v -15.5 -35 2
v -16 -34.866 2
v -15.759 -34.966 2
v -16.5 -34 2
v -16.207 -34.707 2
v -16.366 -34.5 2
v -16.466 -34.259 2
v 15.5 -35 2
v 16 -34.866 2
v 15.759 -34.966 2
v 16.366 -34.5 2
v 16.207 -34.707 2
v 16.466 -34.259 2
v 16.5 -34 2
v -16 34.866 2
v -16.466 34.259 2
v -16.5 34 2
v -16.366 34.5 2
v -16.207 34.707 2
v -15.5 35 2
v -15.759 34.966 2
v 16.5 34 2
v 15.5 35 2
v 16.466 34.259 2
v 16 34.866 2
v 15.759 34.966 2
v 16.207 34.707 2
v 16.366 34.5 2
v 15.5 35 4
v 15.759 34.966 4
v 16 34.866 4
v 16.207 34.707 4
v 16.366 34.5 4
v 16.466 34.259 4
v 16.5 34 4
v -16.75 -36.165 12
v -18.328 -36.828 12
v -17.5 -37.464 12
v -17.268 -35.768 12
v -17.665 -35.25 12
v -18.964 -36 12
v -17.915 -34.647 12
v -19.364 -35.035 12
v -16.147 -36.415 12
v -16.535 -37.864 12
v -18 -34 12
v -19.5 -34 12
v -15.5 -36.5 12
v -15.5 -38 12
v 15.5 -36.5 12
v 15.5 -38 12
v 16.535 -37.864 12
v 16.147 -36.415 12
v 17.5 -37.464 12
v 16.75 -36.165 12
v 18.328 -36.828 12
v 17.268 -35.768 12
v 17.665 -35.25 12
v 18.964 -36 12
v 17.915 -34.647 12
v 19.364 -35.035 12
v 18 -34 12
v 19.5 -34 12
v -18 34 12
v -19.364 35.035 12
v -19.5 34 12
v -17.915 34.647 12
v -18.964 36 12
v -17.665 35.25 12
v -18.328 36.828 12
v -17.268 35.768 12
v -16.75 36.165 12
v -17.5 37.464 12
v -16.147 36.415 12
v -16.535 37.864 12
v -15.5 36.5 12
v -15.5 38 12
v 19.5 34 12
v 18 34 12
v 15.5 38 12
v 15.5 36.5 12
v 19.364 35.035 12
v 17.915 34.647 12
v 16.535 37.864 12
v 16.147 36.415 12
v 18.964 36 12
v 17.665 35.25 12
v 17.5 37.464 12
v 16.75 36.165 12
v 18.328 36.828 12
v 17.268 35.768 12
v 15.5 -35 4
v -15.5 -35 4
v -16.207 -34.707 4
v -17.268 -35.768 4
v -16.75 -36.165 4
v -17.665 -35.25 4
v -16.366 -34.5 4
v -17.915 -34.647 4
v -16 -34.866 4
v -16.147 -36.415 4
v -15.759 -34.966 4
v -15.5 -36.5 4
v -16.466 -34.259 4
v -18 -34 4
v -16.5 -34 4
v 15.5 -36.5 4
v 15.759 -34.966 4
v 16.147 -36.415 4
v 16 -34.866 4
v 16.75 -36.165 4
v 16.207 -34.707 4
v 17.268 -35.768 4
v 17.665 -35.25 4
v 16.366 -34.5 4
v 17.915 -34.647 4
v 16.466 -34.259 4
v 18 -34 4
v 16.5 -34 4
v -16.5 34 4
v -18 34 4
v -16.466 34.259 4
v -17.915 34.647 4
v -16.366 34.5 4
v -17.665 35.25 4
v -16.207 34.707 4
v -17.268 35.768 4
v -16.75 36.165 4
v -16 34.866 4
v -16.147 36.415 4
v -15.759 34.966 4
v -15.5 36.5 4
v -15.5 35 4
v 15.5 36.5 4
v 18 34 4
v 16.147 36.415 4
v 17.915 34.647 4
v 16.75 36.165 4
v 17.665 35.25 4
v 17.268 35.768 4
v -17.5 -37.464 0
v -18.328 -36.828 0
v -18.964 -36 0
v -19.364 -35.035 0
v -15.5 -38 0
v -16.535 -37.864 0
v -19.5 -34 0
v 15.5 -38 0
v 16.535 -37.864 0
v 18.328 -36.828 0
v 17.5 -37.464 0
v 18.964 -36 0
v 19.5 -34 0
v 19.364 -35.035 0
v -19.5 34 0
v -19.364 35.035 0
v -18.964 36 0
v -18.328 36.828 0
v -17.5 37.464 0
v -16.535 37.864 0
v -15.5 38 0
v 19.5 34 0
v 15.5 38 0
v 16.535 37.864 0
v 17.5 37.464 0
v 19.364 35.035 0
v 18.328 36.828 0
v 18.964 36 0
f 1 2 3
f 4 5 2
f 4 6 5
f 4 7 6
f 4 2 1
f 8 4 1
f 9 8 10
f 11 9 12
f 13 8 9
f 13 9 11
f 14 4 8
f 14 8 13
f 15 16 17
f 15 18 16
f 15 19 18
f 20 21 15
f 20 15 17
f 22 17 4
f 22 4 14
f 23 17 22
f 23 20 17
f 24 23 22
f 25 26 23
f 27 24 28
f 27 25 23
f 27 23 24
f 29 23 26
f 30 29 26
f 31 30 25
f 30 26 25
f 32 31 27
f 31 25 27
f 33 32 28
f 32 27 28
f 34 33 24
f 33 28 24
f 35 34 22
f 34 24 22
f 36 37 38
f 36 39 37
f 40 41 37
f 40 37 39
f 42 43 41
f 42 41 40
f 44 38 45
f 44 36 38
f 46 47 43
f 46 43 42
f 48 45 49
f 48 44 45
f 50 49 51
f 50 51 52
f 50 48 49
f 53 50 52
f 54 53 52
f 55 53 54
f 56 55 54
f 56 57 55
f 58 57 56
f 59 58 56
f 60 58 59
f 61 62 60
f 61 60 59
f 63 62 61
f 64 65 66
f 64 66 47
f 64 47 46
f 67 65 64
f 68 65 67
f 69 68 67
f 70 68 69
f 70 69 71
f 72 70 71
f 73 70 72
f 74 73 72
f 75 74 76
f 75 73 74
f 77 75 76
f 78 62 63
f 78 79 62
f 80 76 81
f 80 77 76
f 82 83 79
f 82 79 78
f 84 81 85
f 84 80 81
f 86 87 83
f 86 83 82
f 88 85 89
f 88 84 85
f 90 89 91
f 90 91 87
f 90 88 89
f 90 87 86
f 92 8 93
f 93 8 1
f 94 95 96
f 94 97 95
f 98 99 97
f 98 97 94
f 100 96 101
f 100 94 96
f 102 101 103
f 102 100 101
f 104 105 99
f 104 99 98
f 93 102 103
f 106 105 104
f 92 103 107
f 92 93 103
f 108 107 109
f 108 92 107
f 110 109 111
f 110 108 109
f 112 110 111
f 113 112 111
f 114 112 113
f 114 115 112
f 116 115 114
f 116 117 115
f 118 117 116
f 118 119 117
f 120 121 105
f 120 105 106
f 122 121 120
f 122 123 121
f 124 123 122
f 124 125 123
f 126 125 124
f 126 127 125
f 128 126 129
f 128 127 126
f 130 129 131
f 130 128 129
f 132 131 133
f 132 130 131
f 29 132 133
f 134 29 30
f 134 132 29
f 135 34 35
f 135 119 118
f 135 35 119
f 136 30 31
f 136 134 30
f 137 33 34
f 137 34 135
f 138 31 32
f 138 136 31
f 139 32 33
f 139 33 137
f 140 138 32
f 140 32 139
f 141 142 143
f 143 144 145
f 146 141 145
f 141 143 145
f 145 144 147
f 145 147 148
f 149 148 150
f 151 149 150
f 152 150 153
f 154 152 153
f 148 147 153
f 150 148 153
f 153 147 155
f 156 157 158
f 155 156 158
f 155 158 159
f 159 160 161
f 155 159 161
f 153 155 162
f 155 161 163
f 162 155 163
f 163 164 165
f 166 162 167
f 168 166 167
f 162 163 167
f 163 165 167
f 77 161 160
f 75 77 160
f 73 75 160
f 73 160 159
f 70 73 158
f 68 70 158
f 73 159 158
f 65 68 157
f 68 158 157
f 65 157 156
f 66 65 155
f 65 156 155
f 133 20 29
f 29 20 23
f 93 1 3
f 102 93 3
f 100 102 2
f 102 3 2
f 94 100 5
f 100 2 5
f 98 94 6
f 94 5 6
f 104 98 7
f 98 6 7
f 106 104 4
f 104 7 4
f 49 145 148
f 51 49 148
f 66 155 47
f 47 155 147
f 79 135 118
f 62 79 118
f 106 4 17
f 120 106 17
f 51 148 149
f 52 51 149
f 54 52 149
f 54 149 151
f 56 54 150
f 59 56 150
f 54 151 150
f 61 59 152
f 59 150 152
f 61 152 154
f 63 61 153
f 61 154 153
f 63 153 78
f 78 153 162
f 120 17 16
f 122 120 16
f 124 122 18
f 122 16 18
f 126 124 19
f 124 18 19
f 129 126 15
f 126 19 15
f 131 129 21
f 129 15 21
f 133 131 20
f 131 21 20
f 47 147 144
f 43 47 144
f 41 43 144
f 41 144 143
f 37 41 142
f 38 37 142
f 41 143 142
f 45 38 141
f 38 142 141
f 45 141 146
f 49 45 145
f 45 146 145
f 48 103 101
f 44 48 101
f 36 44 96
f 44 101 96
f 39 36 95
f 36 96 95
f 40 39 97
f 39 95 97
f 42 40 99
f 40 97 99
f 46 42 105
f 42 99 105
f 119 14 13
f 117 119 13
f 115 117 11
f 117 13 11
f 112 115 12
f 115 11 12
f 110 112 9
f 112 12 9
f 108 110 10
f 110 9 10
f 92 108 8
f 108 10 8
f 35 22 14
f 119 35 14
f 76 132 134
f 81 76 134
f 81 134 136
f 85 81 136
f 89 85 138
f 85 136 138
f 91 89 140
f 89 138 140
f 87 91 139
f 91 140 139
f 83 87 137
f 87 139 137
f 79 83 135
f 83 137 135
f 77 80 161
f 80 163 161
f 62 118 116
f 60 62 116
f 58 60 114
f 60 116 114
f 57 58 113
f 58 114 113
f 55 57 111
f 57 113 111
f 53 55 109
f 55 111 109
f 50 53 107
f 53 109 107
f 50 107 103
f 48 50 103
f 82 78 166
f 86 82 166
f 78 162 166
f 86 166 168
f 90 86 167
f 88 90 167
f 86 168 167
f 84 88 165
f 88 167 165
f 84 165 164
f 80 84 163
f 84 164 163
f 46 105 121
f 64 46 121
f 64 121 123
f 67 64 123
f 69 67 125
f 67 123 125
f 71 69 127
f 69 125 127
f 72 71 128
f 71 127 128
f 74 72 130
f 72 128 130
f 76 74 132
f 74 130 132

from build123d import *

# Parameters (mm, degrees)
F1_DEPTH = 2
F3_DEPTH = 2
F5_DEPTH = 10


with BuildPart() as f1:
    # F0 (on Top) → F1 (new body)
    with BuildSketch(Plane.XY):
        with BuildLine():
            Line((15.5, 38), (-15.5, 38))
            ThreePointArc((-15.5, 38), (-18.328427, 36.828427), (-19.5, 34))
            Line((-19.5, 34), (-19.5, -34))
            ThreePointArc((-19.5, -34), (-18.328427, -36.828427), (-15.5, -38))
            Line((-15.5, -38), (15.5, -38))
            ThreePointArc((15.5, -38), (18.328427, -36.828427), (19.5, -34))
            Line((19.5, -34), (19.5, 34))
            ThreePointArc((19.5, 34), (18.328427, 36.828427), (15.5, 38))
        make_face()
    extrude(amount=F1_DEPTH)

    # F2 (on face) → F3 (join)
    with BuildSketch(Plane.XY.offset(2)):
        with BuildLine():
            Line((19.5, -34), (19.5, 34))
            ThreePointArc((19.5, 34), (18.328427, 36.828427), (15.5, 38))
            Line((15.5, 38), (-15.5, 38))
            ThreePointArc((-15.5, 38), (-18.328427, 36.828427), (-19.5, 34))
            Line((-19.5, 34), (-19.5, -34))
            ThreePointArc((-19.5, -34), (-18.328427, -36.828427), (-15.5, -38))
            Line((-15.5, -38), (15.5, -38))
            ThreePointArc((15.5, -38), (18.328427, -36.828427), (19.5, -34))
        make_face()
        with BuildLine():
            ThreePointArc((-16.5, 34), (-16.207107, 34.707107), (-15.5, 35))
            Line((-15.5, 35), (15.5, 35))
            ThreePointArc((15.5, 35), (16.207107, 34.707107), (16.5, 34))
            Line((16.5, 34), (16.5, -34))
            ThreePointArc((16.5, -34), (16.207107, -34.707107), (15.5, -35))
            Line((15.5, -35), (-15.5, -35))
            ThreePointArc((-15.5, -35), (-16.207107, -34.707107), (-16.5, -34))
            Line((-16.5, -34), (-16.5, 34))
        make_face(mode=Mode.SUBTRACT)
    extrude(amount=F3_DEPTH)

    # F4 (on face) → F5 (join)
    with BuildSketch(Plane.XY.offset(2)):
        with BuildLine():
            ThreePointArc((-15.5, 38), (-18.328427, 36.828427), (-19.5, 34))
            Line((-19.5, 34), (-19.5, -34))
            ThreePointArc((-19.5, -34), (-18.328427, -36.828427), (-15.5, -38))
            Line((-15.5, -38), (15.5, -38))
            ThreePointArc((15.5, -38), (18.328427, -36.828427), (19.5, -34))
            Line((19.5, -34), (19.5, 34))
            ThreePointArc((19.5, 34), (18.328427, 36.828427), (15.5, 38))
            Line((15.5, 38), (-15.5, 38))
        make_face()
        with BuildLine():
            ThreePointArc((-18, 34), (-17.267767, 35.767767), (-15.5, 36.5))
            Line((-15.5, 36.5), (15.5, 36.5))
            ThreePointArc((15.5, 36.5), (17.267767, 35.767767), (18, 34))
            Line((18, 34), (18, -34))
            ThreePointArc((18, -34), (17.267767, -35.767767), (15.5, -36.5))
            Line((15.5, -36.5), (-15.5, -36.5))
            ThreePointArc((-15.5, -36.5), (-17.267767, -35.767767), (-18, -34))
            Line((-18, -34), (-18, 34))
        make_face(mode=Mode.SUBTRACT)
    extrude(amount=F5_DEPTH)


solid = f1.part
